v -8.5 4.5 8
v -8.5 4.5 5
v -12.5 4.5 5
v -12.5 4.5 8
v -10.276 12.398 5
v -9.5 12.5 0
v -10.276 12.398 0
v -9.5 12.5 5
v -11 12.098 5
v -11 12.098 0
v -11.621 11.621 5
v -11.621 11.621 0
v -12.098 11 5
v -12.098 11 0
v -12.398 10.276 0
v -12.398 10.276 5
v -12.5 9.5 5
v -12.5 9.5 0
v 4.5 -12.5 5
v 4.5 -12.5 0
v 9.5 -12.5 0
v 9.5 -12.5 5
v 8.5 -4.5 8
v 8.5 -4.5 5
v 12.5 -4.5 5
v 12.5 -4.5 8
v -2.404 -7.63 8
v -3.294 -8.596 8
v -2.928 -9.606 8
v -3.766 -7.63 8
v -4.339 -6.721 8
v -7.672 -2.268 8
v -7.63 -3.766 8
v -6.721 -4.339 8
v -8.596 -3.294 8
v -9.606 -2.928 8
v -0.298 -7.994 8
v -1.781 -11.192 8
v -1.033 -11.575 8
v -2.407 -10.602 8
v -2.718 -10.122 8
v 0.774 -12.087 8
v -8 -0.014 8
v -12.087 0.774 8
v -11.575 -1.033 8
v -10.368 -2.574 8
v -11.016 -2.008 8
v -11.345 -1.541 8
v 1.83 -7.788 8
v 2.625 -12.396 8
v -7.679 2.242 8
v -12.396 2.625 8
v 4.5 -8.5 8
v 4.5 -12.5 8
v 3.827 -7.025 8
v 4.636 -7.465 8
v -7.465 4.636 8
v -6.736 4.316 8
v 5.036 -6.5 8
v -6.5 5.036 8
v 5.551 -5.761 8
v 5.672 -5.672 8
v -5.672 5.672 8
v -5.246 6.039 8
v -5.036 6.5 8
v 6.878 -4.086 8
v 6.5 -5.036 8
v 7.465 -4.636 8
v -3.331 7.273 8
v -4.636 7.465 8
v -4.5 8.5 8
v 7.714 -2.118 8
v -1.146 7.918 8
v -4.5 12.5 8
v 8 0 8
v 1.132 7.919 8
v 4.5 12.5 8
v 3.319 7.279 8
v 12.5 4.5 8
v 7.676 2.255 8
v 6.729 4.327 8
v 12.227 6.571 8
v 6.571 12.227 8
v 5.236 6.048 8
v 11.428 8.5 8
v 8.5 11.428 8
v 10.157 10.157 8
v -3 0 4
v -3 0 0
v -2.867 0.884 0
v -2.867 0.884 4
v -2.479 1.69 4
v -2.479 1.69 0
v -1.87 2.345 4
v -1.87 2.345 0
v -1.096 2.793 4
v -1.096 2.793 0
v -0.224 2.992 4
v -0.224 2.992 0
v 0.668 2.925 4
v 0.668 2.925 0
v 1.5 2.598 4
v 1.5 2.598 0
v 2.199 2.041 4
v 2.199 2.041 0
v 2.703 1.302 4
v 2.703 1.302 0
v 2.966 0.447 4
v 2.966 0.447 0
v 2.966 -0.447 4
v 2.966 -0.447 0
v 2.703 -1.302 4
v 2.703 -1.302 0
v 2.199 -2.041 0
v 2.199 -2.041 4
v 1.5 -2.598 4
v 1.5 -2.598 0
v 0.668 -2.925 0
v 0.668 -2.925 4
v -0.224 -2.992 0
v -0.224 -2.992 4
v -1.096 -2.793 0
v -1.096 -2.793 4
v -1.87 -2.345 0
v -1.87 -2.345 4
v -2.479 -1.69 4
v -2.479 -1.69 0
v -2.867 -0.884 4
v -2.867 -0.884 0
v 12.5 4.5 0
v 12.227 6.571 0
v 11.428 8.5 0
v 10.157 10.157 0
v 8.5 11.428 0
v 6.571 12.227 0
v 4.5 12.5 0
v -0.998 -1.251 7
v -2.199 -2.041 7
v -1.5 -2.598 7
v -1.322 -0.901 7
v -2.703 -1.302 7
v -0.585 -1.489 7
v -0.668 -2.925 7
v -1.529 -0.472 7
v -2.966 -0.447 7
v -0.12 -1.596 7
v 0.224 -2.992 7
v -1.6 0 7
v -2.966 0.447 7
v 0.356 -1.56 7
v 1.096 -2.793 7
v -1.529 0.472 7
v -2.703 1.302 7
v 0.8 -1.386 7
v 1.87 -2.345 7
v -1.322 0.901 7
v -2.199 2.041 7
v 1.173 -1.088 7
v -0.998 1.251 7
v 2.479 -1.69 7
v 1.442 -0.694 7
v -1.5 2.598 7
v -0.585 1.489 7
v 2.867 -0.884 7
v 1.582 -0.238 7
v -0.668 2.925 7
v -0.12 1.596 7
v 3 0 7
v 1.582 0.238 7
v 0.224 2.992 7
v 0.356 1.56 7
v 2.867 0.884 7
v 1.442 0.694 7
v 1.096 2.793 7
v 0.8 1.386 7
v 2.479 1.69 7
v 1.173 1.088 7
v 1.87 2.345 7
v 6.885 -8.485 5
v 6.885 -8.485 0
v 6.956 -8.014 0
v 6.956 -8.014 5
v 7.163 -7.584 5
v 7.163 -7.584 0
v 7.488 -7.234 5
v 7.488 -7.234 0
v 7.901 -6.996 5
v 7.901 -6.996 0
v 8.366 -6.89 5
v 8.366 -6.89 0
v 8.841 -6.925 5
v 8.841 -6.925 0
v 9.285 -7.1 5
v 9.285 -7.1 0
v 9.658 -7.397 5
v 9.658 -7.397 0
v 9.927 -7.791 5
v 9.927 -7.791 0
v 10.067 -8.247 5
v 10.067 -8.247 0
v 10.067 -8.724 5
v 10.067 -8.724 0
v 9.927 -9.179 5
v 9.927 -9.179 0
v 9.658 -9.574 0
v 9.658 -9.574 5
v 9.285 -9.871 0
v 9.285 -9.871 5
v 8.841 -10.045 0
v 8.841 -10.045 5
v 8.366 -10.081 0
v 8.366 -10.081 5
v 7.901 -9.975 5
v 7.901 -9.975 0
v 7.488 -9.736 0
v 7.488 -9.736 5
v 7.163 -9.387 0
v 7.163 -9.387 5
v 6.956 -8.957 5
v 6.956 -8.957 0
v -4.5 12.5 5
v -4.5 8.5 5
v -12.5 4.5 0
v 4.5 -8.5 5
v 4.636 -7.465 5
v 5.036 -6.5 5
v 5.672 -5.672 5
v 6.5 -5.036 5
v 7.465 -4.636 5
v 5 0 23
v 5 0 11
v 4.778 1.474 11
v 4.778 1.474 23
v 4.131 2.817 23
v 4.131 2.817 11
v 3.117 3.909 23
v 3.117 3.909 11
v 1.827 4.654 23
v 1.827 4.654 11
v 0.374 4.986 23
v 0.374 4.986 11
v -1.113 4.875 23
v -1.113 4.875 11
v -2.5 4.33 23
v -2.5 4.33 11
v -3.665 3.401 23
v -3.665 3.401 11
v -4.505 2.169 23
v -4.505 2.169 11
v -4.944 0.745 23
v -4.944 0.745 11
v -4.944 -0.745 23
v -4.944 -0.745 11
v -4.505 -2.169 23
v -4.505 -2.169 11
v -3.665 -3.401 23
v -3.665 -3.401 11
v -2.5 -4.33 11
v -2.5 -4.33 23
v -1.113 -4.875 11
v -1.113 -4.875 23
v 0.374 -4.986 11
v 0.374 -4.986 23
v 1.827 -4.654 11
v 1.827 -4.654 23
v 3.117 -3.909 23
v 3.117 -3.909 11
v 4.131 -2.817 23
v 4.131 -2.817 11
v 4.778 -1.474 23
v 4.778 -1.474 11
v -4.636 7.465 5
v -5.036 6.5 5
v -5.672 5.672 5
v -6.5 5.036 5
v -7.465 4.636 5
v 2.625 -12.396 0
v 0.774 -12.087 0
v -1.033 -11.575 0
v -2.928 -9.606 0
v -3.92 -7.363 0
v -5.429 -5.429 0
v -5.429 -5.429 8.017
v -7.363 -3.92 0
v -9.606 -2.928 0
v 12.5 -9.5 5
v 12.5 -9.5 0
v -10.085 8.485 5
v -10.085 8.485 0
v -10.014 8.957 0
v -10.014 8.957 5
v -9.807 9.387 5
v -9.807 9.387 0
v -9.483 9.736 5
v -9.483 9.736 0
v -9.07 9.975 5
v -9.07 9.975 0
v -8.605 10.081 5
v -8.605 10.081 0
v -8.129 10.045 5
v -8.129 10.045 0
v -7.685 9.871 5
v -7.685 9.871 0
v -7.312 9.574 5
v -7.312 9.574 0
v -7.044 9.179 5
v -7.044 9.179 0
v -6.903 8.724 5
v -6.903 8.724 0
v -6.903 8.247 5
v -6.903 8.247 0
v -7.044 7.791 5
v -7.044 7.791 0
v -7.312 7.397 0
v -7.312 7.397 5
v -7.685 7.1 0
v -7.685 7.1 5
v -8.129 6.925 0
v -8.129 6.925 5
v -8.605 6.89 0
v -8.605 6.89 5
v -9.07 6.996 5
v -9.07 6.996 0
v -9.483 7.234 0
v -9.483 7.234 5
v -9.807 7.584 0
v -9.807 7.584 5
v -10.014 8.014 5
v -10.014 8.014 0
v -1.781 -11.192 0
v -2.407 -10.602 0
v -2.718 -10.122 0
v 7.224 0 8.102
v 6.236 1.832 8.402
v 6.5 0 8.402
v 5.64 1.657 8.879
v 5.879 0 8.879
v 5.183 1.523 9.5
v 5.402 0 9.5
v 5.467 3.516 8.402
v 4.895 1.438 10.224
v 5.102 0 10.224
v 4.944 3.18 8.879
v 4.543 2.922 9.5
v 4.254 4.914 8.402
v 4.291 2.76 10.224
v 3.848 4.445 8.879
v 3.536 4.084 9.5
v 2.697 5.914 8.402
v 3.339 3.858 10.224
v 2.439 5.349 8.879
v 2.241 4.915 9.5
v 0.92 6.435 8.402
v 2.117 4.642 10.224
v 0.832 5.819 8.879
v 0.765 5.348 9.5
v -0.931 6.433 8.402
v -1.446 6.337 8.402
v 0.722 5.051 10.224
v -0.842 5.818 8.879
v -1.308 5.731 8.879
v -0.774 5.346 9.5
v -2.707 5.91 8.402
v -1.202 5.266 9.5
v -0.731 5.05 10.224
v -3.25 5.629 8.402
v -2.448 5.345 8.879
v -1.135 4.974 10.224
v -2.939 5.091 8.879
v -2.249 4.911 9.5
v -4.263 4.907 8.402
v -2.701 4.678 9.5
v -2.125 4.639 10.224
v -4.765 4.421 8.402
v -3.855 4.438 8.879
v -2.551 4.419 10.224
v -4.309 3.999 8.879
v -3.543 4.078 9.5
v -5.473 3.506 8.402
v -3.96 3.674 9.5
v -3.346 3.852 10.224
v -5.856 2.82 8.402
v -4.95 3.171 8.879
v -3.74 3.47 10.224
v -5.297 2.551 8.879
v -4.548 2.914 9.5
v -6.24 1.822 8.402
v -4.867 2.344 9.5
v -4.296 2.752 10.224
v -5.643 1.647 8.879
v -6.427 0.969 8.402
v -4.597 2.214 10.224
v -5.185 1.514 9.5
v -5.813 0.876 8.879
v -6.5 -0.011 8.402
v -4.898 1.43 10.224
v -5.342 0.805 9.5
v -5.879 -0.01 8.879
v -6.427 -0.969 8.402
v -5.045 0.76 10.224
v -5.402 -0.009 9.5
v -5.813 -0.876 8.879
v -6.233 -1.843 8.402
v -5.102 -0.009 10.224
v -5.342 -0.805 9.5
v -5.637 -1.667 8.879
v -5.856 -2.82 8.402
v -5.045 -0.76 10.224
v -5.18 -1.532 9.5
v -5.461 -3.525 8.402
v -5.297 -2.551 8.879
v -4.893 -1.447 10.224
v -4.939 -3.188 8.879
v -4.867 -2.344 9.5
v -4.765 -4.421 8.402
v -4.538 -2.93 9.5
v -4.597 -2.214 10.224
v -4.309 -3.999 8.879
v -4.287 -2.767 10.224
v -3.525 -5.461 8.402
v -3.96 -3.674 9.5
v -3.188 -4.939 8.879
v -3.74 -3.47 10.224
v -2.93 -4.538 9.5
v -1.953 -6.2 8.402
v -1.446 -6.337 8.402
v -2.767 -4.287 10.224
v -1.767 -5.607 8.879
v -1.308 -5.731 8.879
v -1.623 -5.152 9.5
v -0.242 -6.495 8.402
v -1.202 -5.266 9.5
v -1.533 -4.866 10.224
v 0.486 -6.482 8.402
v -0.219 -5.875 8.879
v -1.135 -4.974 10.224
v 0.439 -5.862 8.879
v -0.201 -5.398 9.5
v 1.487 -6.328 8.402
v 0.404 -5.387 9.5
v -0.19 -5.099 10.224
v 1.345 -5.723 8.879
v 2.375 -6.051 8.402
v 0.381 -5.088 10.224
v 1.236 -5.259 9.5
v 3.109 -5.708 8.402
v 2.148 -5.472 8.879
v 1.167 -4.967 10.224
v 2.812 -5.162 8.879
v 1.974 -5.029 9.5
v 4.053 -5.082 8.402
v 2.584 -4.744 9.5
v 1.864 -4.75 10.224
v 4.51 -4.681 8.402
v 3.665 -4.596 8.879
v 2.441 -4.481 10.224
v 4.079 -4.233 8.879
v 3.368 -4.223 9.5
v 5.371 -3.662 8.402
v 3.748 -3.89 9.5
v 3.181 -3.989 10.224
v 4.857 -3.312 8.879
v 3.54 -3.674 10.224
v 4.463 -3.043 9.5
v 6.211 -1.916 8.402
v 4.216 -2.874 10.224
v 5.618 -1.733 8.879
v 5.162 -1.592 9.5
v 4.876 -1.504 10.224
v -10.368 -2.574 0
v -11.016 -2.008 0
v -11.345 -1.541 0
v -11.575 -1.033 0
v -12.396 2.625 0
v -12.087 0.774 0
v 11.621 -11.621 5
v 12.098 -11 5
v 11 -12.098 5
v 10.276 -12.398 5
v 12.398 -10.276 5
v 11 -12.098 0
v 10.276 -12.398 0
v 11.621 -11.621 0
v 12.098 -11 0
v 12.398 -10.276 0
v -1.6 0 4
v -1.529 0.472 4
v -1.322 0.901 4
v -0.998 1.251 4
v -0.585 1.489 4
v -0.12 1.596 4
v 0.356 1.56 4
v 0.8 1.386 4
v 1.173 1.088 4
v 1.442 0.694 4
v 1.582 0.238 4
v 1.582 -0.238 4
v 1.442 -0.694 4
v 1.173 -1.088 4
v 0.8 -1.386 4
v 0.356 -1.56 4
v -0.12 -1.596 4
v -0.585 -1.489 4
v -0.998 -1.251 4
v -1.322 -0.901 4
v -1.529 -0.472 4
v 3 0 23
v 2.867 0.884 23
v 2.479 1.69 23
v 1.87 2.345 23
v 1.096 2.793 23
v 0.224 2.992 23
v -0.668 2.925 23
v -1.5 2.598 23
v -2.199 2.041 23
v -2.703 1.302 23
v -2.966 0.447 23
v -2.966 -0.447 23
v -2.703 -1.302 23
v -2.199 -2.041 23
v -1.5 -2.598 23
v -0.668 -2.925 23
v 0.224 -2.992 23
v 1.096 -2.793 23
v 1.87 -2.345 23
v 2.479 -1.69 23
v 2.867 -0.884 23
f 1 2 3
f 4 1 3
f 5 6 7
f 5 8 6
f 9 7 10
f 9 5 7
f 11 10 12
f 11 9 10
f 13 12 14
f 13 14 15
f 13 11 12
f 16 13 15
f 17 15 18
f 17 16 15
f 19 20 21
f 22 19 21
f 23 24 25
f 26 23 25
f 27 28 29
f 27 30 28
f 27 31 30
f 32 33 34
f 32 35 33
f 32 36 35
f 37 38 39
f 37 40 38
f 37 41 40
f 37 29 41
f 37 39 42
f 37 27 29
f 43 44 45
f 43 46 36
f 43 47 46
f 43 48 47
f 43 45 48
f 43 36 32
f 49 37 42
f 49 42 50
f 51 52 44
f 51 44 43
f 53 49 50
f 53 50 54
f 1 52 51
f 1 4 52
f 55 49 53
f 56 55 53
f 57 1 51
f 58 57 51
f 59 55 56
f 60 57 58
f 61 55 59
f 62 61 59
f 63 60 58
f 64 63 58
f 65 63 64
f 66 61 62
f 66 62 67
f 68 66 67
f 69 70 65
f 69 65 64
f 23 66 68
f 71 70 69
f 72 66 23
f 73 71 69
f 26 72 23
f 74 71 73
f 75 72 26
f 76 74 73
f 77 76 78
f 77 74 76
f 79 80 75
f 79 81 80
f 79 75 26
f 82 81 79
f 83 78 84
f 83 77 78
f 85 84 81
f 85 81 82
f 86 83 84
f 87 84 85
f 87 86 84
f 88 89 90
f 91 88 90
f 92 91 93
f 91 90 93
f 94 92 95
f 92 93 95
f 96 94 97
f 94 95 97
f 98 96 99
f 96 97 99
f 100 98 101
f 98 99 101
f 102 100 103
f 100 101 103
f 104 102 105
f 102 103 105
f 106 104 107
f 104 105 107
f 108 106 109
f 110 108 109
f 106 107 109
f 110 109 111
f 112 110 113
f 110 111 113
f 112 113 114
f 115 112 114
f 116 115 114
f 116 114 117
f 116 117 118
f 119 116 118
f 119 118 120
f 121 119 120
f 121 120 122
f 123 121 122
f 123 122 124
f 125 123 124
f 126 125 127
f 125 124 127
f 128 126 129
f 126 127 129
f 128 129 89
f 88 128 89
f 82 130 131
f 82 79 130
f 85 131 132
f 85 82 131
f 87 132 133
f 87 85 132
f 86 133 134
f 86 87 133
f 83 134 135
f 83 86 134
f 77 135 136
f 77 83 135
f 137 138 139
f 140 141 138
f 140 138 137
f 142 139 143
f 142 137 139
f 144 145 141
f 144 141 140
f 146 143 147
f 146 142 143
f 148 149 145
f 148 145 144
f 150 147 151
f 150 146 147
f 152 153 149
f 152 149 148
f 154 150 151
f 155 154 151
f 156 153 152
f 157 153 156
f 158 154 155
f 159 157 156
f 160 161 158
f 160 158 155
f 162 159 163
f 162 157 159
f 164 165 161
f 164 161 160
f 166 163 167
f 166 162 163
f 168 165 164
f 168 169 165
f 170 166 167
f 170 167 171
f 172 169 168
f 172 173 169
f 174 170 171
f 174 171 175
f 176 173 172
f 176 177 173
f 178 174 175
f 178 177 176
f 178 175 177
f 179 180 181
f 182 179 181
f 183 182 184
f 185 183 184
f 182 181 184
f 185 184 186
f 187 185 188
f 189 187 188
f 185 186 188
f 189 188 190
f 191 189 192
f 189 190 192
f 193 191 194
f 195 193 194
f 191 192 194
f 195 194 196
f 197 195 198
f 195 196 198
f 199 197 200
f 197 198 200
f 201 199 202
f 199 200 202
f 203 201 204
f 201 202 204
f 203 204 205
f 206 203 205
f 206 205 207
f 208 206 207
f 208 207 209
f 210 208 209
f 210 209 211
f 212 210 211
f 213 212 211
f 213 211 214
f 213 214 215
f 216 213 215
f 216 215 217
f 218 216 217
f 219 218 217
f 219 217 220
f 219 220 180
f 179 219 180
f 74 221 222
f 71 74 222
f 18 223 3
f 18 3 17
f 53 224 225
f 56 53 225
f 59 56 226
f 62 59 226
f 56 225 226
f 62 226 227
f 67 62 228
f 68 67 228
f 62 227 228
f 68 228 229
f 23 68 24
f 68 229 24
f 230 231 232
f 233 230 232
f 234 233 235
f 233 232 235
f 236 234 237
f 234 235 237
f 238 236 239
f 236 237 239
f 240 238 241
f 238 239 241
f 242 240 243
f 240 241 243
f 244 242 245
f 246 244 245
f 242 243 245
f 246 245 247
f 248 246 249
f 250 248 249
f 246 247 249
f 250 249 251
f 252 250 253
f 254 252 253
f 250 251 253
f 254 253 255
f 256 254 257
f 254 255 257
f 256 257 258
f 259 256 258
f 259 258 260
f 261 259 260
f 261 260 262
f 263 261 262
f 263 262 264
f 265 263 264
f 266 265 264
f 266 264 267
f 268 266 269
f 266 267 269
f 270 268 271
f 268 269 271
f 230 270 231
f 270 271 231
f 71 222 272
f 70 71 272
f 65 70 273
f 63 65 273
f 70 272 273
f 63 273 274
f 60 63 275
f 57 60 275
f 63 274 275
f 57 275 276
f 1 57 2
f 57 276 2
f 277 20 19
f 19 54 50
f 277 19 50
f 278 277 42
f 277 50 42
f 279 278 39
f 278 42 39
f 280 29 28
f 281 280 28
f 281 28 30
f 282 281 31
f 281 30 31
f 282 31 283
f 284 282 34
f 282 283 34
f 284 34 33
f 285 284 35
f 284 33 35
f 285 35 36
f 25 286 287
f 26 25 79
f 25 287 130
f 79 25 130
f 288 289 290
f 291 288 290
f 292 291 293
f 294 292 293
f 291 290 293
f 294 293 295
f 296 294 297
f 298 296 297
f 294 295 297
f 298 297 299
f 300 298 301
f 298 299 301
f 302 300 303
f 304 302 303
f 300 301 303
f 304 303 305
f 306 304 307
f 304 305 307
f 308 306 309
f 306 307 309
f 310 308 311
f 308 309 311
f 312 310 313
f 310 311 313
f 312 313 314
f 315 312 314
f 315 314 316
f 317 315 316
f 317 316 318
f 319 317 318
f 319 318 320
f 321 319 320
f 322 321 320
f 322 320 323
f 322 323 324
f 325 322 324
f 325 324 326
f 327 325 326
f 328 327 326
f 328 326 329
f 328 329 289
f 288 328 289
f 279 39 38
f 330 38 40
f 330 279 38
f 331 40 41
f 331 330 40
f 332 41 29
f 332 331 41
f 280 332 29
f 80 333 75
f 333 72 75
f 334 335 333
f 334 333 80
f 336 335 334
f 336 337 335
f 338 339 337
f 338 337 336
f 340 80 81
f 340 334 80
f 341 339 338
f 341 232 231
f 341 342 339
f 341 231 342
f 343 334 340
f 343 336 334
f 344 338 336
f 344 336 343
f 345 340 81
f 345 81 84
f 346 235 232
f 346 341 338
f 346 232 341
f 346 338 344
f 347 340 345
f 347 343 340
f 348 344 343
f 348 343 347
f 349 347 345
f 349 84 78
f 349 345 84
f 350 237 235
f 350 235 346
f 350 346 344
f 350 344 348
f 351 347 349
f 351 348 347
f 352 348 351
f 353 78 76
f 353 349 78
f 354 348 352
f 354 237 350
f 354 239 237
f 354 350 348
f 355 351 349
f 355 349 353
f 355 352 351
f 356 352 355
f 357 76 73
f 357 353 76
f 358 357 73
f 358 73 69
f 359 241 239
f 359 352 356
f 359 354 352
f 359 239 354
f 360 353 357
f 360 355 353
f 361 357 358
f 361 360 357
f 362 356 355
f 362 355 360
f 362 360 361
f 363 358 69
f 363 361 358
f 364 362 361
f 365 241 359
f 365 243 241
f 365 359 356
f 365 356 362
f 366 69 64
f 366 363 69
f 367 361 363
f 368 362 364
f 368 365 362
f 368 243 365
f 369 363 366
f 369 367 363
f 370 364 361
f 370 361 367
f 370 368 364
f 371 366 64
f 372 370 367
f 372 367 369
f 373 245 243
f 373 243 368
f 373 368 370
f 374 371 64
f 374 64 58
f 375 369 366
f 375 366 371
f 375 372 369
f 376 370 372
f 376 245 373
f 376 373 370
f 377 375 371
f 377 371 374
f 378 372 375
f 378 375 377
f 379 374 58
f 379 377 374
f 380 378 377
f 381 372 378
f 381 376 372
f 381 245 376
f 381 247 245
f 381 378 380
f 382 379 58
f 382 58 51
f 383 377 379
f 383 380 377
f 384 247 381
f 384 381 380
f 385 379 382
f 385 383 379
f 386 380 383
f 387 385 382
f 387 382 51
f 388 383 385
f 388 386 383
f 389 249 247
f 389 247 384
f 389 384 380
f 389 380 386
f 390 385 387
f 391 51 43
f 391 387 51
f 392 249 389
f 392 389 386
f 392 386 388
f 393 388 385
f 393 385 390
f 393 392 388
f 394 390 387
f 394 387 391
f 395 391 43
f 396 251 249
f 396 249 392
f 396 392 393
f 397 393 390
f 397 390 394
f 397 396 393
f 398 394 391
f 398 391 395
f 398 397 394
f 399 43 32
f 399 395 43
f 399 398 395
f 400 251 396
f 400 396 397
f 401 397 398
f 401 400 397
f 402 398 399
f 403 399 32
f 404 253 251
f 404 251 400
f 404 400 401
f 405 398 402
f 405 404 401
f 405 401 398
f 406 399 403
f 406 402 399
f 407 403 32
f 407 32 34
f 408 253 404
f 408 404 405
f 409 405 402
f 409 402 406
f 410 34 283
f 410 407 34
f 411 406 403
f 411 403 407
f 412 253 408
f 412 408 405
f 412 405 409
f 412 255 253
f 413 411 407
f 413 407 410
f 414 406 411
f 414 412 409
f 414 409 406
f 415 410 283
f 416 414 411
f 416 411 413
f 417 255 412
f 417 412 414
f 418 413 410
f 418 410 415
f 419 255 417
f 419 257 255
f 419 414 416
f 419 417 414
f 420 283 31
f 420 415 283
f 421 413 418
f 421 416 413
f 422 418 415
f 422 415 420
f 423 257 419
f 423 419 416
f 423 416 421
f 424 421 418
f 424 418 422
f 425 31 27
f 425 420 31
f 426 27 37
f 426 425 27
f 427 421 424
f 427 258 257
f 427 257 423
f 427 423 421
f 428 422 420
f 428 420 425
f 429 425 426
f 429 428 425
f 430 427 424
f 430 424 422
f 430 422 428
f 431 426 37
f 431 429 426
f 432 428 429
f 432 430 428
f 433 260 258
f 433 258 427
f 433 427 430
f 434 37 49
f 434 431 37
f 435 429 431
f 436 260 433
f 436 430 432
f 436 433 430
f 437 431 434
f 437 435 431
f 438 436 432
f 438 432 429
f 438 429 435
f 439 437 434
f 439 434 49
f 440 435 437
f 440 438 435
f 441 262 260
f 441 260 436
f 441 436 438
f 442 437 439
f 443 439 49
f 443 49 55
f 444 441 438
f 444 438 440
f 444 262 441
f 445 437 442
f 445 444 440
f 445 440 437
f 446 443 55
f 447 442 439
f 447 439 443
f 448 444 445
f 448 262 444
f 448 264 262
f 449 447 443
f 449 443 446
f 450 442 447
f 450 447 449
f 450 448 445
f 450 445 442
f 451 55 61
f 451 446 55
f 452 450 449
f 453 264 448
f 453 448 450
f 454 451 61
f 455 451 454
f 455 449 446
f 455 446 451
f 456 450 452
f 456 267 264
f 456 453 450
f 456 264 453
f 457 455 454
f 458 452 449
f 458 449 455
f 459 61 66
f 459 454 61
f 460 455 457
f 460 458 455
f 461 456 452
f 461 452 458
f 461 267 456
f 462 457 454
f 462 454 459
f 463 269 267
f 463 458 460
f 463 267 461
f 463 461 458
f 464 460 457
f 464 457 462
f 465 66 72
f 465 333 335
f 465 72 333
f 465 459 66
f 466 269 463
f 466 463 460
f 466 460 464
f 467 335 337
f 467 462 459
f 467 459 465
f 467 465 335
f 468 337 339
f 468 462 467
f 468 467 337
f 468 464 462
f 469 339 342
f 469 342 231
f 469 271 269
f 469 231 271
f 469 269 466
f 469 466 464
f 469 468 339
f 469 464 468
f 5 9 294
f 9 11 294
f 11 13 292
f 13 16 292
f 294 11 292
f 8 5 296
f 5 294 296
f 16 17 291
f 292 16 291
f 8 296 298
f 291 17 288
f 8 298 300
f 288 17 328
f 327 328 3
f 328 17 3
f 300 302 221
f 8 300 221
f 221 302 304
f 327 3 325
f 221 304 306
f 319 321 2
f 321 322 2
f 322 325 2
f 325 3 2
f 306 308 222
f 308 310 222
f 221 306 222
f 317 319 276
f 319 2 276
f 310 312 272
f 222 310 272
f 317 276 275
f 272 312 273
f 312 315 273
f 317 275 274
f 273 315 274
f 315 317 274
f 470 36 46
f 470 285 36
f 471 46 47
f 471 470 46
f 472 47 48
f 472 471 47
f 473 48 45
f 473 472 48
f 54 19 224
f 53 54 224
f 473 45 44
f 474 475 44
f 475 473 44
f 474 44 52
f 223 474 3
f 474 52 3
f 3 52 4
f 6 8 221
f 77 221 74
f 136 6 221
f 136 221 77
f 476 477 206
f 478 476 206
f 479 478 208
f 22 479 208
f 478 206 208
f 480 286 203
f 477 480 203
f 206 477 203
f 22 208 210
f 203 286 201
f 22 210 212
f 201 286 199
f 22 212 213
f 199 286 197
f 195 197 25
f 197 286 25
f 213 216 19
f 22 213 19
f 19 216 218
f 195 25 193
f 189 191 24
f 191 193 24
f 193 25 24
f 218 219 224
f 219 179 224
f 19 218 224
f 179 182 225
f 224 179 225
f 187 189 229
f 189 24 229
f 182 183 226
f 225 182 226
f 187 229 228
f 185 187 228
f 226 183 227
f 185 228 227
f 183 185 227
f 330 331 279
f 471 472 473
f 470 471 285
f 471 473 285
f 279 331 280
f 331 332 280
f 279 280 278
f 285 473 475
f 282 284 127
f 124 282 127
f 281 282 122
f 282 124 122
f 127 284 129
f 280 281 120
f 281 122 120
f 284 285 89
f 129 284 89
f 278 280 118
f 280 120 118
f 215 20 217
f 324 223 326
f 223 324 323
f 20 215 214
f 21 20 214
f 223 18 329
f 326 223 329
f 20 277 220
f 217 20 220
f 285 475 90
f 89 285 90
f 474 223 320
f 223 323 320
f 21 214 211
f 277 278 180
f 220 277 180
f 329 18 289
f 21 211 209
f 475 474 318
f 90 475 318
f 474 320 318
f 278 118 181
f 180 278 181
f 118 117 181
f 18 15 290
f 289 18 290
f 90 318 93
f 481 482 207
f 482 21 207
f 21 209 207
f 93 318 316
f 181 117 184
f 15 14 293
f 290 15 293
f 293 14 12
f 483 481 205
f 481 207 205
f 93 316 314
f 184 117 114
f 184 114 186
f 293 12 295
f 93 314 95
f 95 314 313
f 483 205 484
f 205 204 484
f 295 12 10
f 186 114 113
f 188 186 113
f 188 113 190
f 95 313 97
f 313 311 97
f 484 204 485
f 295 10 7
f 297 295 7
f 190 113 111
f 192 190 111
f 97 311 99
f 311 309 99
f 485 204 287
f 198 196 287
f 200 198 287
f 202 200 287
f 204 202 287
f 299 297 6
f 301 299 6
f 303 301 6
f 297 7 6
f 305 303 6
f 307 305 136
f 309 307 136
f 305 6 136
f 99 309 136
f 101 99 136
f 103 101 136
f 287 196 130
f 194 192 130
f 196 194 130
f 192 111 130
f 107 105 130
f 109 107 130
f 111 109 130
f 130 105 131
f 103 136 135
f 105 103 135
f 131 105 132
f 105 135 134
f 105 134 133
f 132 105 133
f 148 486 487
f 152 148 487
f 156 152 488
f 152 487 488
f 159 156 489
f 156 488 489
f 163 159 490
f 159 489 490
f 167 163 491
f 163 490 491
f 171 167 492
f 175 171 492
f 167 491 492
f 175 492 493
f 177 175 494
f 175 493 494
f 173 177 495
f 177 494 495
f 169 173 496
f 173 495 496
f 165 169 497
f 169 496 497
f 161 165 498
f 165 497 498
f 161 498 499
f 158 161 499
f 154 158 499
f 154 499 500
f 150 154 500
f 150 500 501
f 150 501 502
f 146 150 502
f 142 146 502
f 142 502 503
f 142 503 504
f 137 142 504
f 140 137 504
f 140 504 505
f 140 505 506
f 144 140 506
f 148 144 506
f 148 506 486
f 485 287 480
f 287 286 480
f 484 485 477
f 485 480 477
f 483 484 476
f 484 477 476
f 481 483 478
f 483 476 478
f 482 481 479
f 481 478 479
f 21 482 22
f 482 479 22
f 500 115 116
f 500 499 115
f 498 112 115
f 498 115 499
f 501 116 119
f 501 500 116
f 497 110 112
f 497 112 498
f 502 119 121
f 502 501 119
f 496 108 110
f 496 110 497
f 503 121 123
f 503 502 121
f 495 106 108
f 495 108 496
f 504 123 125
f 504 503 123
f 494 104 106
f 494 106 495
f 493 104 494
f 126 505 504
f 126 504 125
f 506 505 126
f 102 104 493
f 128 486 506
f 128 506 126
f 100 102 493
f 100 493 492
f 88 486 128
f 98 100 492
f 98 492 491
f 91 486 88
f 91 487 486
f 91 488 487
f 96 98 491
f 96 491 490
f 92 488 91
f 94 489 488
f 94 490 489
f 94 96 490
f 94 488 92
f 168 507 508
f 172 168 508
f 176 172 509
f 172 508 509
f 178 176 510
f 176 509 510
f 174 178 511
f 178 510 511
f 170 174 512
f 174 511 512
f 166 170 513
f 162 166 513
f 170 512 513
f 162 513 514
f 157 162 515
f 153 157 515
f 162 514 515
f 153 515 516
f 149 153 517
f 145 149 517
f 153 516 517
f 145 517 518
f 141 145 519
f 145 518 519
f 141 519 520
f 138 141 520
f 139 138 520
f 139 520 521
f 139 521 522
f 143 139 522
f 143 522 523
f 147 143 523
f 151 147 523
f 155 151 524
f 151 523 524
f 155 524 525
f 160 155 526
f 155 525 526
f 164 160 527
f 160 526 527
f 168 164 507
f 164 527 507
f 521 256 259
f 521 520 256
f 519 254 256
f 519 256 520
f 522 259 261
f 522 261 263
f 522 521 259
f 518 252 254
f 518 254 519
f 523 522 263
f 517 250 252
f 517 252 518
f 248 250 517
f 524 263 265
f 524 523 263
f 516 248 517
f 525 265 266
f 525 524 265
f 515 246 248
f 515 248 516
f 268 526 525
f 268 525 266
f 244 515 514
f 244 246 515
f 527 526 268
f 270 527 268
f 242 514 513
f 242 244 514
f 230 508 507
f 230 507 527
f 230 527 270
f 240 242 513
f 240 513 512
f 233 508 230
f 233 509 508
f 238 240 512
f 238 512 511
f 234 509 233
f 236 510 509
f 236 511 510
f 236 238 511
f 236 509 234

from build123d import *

# Parameters (mm, degrees)
SCHIZZO1_W                           = 25
SCHIZZO1_H                           = 25
ESTRUSIONE_ESTRUSIONE1_DEPTH         = 8
SCHIZZO8_R                           = 5
ESTRUSIONE_ESTRUSIONE3_DEPTH         = 15
RACCORDO1_R                          = 3
TAGLIO_ESTRUSIONE2_REACH             = 25
SCHIZZO9_R                           = 1.6
SCHIZZO10_R                          = 3
TAGLIO_ESTRUSIONE3_DEPTH             = 4
SCHIZZO11_R                          = 3
TAGLIO_ESTRUSIONE4_DEPTH             = 16
TAGLIO_ESTRUSIONE6_REACH             = 25
SCHIZZO13_R                          = 1.6
TAGLIO_ESTRUSIONE8_START             = -3
TAGLIO_ESTRUSIONE8_DEPTH             = 19
RIPETIZIONECIRCOLARE1_COUNT          = 2
RIPETIZIONECIRCOLARE1_ANGLE          = 180
TAGLIO_ESTRUSIONE9_REACH             = 10
TAGLIO_ESTRUSIONE9_DIRECTION_2_REACH = 17
RACCORDO2_R                          = 3
RACCORDO3_R                          = 3
RACCORDO4_R                          = 8


with BuildPart() as part:
    # Schizzo1 → Estrusione-Estrusione1 (new body)
    with BuildSketch(Plane.XY):
        Rectangle(SCHIZZO1_W, SCHIZZO1_H)
    extrude(amount=ESTRUSIONE_ESTRUSIONE1_DEPTH)

    # Schizzo8 → Estrusione-Estrusione3 (add)
    with BuildSketch(Plane.XY.offset(8)):
        Circle(SCHIZZO8_R)
    extrude(amount=ESTRUSIONE_ESTRUSIONE3_DEPTH)

    # Raccordo1
    raccordo1_edges = [part.edges().sort_by_distance(p)[0] for p in [
        (-5, 0, 8),
    ]]
    fillet(raccordo1_edges, radius=RACCORDO1_R)

    # Schizzo9 → Taglio-Estrusione2 (cut, up to next)
    with BuildSketch(Plane(origin=(0, 0, 0), x_dir=(-1, 0, 0), z_dir=(0, 0, -1)), mode=Mode.PRIVATE) as taglio_estrusione2_sk1:
        Circle(SCHIZZO9_R)
    taglio_estrusione2_tool1 = extrude(taglio_estrusione2_sk1.sketch, amount=-TAGLIO_ESTRUSIONE2_REACH, mode=Mode.PRIVATE) & part.part
    add(taglio_estrusione2_tool1.solids().sort_by_distance((0, 0, 0))[0], mode=Mode.SUBTRACT)

    # Schizzo10 → Taglio-Estrusione3 (cut)
    with BuildSketch(Plane(origin=(0, 0, 0), x_dir=(-1, 0, 0), z_dir=(0, 0, -1))):
        Circle(SCHIZZO10_R)
    extrude(amount=-TAGLIO_ESTRUSIONE3_DEPTH, mode=Mode.SUBTRACT)

    # Schizzo11 → Taglio-Estrusione4 (cut)
    with BuildSketch(Plane.XY.offset(23)):
        Circle(SCHIZZO11_R)
    extrude(amount=-TAGLIO_ESTRUSIONE4_DEPTH, mode=Mode.SUBTRACT)

    # Schizzo13 → Taglio-Estrusione6 (cut, up to next)
    with BuildSketch(Plane(origin=(0, 0, 0), x_dir=(-1, 0, 0), z_dir=(0, 0, -1)), mode=Mode.PRIVATE) as taglio_estrusione6_sk1:
        with Locations((-8.485281374, -8.485281374)):
            Circle(SCHIZZO13_R)
    taglio_estrusione6_tool1 = extrude(taglio_estrusione6_sk1.sketch, amount=-TAGLIO_ESTRUSIONE6_REACH, mode=Mode.PRIVATE) & part.part
    add(taglio_estrusione6_tool1.solids().sort_by_distance((8.485281, -8.485281, 0))[0], mode=Mode.SUBTRACT)
    # Schizzo13 → Taglio-Estrusione6 (cut, up to next)
    with BuildSketch(Plane(origin=(0, 0, 0), x_dir=(-1, 0, 0), z_dir=(0, 0, -1)), mode=Mode.PRIVATE) as taglio_estrusione6_sk2:
        with Locations((8.485281374, 8.485281374)):
            Circle(SCHIZZO13_R)
    taglio_estrusione6_tool2 = extrude(taglio_estrusione6_sk2.sketch, amount=-TAGLIO_ESTRUSIONE6_REACH, mode=Mode.PRIVATE) & part.part
    add(taglio_estrusione6_tool2.solids().sort_by_distance((-8.485281, 8.485281, 0))[0], mode=Mode.SUBTRACT)

    # Schizzo17 → Taglio-Estrusione8 (cut)
    with BuildSketch(Plane.XY.offset(8).offset(TAGLIO_ESTRUSIONE8_START)):
        with BuildLine():
            Line((4.5, -12.5), (4.5, -8.5))
            ThreePointArc((4.5, -8.5), (5.671572875, -5.671572875), (8.5, -4.5))
            Line((8.5, -4.5), (12.5, -4.5))
            Line((12.5, -4.5), (12.5, -12.5))
            Line((12.5, -12.5), (4.5, -12.5))
        make_face()
    taglio_estrusione8 = extrude(amount=TAGLIO_ESTRUSIONE8_DEPTH, mode=Mode.SUBTRACT)

    # RipetizioneCircolare1: Taglio-Estrusione8 ×2 about axis
    ripetizionecircolare1_axis = Axis((0, 0, 0), (0, 0, 1))
    for i in range(1, RIPETIZIONECIRCOLARE1_COUNT):
        add(taglio_estrusione8.rotate(ripetizionecircolare1_axis, i * RIPETIZIONECIRCOLARE1_ANGLE / (RIPETIZIONECIRCOLARE1_COUNT - 1)), mode=Mode.SUBTRACT)

    # Schizzo20 → Taglio-Estrusione9 (cut, up to next)
    with BuildSketch(Plane.XY.offset(8), mode=Mode.PRIVATE) as taglio_estrusione9_sk1:
        with BuildLine():
            Line((-12.5, -12.5), (4.5, -12.5))
            ThreePointArc((4.5, -12.5), (0.853575925, -12.104324481), (-2.623106886, -10.935716643))
            ThreePointArc((-2.623106886, -10.935716643), (-5.428932188, -5.428932188), (-10.935716643, -2.623106886))
            ThreePointArc((-10.935716643, -2.623106886), (-12.104324481, 0.853575925), (-12.5, 4.5))
            Line((-12.5, 4.5), (-12.5, -12.5))
        make_face()
    taglio_estrusione9_tool1 = extrude(taglio_estrusione9_sk1.sketch, amount=-TAGLIO_ESTRUSIONE9_REACH, mode=Mode.PRIVATE) & part.part
    add(taglio_estrusione9_tool1.solids().sort_by_distance((-8.104879, -8.104879, 8))[0], mode=Mode.SUBTRACT)

    # Schizzo20 → Taglio-Estrusione9 direction 2 (cut, up to next)
    with BuildSketch(Plane.XY.offset(8), mode=Mode.PRIVATE) as taglio_estrusione9_direction_2_sk1:
        with BuildLine():
            Line((-12.5, -12.5), (4.5, -12.5))
            ThreePointArc((4.5, -12.5), (0.853575925, -12.104324481), (-2.623106886, -10.935716643))
            ThreePointArc((-2.623106886, -10.935716643), (-5.428932188, -5.428932188), (-10.935716643, -2.623106886))
            ThreePointArc((-10.935716643, -2.623106886), (-12.104324481, 0.853575925), (-12.5, 4.5))
            Line((-12.5, 4.5), (-12.5, -12.5))
        make_face()
    taglio_estrusione9_direction_2_tool1 = extrude(taglio_estrusione9_direction_2_sk1.sketch, amount=TAGLIO_ESTRUSIONE9_DIRECTION_2_REACH, mode=Mode.PRIVATE) & part.part
    add(taglio_estrusione9_direction_2_tool1.solids().sort_by_distance((-8.104879, -8.104879, 8))[0], mode=Mode.SUBTRACT)

    # Raccordo2
    raccordo2_edges = [part.edges().sort_by_distance(p)[0] for p in [
        (-10.935716643, -2.623106886, 4),
        (-2.623106886, -10.935716643, 4),
    ]]
    fillet(raccordo2_edges, radius=RACCORDO2_R)

    # Raccordo3
    raccordo3_edges = [part.edges().sort_by_distance(p)[0] for p in [
        (12.5, -12.5, 2.5),
        (-12.5, 12.5, 2.5),
    ]]
    fillet(raccordo3_edges, radius=RACCORDO3_R)

    # Raccordo4
    raccordo4_edges = [part.edges().sort_by_distance(p)[0] for p in [
        (12.5, 12.5, 4),
    ]]
    fillet(raccordo4_edges, radius=RACCORDO4_R)


solid = part.part
